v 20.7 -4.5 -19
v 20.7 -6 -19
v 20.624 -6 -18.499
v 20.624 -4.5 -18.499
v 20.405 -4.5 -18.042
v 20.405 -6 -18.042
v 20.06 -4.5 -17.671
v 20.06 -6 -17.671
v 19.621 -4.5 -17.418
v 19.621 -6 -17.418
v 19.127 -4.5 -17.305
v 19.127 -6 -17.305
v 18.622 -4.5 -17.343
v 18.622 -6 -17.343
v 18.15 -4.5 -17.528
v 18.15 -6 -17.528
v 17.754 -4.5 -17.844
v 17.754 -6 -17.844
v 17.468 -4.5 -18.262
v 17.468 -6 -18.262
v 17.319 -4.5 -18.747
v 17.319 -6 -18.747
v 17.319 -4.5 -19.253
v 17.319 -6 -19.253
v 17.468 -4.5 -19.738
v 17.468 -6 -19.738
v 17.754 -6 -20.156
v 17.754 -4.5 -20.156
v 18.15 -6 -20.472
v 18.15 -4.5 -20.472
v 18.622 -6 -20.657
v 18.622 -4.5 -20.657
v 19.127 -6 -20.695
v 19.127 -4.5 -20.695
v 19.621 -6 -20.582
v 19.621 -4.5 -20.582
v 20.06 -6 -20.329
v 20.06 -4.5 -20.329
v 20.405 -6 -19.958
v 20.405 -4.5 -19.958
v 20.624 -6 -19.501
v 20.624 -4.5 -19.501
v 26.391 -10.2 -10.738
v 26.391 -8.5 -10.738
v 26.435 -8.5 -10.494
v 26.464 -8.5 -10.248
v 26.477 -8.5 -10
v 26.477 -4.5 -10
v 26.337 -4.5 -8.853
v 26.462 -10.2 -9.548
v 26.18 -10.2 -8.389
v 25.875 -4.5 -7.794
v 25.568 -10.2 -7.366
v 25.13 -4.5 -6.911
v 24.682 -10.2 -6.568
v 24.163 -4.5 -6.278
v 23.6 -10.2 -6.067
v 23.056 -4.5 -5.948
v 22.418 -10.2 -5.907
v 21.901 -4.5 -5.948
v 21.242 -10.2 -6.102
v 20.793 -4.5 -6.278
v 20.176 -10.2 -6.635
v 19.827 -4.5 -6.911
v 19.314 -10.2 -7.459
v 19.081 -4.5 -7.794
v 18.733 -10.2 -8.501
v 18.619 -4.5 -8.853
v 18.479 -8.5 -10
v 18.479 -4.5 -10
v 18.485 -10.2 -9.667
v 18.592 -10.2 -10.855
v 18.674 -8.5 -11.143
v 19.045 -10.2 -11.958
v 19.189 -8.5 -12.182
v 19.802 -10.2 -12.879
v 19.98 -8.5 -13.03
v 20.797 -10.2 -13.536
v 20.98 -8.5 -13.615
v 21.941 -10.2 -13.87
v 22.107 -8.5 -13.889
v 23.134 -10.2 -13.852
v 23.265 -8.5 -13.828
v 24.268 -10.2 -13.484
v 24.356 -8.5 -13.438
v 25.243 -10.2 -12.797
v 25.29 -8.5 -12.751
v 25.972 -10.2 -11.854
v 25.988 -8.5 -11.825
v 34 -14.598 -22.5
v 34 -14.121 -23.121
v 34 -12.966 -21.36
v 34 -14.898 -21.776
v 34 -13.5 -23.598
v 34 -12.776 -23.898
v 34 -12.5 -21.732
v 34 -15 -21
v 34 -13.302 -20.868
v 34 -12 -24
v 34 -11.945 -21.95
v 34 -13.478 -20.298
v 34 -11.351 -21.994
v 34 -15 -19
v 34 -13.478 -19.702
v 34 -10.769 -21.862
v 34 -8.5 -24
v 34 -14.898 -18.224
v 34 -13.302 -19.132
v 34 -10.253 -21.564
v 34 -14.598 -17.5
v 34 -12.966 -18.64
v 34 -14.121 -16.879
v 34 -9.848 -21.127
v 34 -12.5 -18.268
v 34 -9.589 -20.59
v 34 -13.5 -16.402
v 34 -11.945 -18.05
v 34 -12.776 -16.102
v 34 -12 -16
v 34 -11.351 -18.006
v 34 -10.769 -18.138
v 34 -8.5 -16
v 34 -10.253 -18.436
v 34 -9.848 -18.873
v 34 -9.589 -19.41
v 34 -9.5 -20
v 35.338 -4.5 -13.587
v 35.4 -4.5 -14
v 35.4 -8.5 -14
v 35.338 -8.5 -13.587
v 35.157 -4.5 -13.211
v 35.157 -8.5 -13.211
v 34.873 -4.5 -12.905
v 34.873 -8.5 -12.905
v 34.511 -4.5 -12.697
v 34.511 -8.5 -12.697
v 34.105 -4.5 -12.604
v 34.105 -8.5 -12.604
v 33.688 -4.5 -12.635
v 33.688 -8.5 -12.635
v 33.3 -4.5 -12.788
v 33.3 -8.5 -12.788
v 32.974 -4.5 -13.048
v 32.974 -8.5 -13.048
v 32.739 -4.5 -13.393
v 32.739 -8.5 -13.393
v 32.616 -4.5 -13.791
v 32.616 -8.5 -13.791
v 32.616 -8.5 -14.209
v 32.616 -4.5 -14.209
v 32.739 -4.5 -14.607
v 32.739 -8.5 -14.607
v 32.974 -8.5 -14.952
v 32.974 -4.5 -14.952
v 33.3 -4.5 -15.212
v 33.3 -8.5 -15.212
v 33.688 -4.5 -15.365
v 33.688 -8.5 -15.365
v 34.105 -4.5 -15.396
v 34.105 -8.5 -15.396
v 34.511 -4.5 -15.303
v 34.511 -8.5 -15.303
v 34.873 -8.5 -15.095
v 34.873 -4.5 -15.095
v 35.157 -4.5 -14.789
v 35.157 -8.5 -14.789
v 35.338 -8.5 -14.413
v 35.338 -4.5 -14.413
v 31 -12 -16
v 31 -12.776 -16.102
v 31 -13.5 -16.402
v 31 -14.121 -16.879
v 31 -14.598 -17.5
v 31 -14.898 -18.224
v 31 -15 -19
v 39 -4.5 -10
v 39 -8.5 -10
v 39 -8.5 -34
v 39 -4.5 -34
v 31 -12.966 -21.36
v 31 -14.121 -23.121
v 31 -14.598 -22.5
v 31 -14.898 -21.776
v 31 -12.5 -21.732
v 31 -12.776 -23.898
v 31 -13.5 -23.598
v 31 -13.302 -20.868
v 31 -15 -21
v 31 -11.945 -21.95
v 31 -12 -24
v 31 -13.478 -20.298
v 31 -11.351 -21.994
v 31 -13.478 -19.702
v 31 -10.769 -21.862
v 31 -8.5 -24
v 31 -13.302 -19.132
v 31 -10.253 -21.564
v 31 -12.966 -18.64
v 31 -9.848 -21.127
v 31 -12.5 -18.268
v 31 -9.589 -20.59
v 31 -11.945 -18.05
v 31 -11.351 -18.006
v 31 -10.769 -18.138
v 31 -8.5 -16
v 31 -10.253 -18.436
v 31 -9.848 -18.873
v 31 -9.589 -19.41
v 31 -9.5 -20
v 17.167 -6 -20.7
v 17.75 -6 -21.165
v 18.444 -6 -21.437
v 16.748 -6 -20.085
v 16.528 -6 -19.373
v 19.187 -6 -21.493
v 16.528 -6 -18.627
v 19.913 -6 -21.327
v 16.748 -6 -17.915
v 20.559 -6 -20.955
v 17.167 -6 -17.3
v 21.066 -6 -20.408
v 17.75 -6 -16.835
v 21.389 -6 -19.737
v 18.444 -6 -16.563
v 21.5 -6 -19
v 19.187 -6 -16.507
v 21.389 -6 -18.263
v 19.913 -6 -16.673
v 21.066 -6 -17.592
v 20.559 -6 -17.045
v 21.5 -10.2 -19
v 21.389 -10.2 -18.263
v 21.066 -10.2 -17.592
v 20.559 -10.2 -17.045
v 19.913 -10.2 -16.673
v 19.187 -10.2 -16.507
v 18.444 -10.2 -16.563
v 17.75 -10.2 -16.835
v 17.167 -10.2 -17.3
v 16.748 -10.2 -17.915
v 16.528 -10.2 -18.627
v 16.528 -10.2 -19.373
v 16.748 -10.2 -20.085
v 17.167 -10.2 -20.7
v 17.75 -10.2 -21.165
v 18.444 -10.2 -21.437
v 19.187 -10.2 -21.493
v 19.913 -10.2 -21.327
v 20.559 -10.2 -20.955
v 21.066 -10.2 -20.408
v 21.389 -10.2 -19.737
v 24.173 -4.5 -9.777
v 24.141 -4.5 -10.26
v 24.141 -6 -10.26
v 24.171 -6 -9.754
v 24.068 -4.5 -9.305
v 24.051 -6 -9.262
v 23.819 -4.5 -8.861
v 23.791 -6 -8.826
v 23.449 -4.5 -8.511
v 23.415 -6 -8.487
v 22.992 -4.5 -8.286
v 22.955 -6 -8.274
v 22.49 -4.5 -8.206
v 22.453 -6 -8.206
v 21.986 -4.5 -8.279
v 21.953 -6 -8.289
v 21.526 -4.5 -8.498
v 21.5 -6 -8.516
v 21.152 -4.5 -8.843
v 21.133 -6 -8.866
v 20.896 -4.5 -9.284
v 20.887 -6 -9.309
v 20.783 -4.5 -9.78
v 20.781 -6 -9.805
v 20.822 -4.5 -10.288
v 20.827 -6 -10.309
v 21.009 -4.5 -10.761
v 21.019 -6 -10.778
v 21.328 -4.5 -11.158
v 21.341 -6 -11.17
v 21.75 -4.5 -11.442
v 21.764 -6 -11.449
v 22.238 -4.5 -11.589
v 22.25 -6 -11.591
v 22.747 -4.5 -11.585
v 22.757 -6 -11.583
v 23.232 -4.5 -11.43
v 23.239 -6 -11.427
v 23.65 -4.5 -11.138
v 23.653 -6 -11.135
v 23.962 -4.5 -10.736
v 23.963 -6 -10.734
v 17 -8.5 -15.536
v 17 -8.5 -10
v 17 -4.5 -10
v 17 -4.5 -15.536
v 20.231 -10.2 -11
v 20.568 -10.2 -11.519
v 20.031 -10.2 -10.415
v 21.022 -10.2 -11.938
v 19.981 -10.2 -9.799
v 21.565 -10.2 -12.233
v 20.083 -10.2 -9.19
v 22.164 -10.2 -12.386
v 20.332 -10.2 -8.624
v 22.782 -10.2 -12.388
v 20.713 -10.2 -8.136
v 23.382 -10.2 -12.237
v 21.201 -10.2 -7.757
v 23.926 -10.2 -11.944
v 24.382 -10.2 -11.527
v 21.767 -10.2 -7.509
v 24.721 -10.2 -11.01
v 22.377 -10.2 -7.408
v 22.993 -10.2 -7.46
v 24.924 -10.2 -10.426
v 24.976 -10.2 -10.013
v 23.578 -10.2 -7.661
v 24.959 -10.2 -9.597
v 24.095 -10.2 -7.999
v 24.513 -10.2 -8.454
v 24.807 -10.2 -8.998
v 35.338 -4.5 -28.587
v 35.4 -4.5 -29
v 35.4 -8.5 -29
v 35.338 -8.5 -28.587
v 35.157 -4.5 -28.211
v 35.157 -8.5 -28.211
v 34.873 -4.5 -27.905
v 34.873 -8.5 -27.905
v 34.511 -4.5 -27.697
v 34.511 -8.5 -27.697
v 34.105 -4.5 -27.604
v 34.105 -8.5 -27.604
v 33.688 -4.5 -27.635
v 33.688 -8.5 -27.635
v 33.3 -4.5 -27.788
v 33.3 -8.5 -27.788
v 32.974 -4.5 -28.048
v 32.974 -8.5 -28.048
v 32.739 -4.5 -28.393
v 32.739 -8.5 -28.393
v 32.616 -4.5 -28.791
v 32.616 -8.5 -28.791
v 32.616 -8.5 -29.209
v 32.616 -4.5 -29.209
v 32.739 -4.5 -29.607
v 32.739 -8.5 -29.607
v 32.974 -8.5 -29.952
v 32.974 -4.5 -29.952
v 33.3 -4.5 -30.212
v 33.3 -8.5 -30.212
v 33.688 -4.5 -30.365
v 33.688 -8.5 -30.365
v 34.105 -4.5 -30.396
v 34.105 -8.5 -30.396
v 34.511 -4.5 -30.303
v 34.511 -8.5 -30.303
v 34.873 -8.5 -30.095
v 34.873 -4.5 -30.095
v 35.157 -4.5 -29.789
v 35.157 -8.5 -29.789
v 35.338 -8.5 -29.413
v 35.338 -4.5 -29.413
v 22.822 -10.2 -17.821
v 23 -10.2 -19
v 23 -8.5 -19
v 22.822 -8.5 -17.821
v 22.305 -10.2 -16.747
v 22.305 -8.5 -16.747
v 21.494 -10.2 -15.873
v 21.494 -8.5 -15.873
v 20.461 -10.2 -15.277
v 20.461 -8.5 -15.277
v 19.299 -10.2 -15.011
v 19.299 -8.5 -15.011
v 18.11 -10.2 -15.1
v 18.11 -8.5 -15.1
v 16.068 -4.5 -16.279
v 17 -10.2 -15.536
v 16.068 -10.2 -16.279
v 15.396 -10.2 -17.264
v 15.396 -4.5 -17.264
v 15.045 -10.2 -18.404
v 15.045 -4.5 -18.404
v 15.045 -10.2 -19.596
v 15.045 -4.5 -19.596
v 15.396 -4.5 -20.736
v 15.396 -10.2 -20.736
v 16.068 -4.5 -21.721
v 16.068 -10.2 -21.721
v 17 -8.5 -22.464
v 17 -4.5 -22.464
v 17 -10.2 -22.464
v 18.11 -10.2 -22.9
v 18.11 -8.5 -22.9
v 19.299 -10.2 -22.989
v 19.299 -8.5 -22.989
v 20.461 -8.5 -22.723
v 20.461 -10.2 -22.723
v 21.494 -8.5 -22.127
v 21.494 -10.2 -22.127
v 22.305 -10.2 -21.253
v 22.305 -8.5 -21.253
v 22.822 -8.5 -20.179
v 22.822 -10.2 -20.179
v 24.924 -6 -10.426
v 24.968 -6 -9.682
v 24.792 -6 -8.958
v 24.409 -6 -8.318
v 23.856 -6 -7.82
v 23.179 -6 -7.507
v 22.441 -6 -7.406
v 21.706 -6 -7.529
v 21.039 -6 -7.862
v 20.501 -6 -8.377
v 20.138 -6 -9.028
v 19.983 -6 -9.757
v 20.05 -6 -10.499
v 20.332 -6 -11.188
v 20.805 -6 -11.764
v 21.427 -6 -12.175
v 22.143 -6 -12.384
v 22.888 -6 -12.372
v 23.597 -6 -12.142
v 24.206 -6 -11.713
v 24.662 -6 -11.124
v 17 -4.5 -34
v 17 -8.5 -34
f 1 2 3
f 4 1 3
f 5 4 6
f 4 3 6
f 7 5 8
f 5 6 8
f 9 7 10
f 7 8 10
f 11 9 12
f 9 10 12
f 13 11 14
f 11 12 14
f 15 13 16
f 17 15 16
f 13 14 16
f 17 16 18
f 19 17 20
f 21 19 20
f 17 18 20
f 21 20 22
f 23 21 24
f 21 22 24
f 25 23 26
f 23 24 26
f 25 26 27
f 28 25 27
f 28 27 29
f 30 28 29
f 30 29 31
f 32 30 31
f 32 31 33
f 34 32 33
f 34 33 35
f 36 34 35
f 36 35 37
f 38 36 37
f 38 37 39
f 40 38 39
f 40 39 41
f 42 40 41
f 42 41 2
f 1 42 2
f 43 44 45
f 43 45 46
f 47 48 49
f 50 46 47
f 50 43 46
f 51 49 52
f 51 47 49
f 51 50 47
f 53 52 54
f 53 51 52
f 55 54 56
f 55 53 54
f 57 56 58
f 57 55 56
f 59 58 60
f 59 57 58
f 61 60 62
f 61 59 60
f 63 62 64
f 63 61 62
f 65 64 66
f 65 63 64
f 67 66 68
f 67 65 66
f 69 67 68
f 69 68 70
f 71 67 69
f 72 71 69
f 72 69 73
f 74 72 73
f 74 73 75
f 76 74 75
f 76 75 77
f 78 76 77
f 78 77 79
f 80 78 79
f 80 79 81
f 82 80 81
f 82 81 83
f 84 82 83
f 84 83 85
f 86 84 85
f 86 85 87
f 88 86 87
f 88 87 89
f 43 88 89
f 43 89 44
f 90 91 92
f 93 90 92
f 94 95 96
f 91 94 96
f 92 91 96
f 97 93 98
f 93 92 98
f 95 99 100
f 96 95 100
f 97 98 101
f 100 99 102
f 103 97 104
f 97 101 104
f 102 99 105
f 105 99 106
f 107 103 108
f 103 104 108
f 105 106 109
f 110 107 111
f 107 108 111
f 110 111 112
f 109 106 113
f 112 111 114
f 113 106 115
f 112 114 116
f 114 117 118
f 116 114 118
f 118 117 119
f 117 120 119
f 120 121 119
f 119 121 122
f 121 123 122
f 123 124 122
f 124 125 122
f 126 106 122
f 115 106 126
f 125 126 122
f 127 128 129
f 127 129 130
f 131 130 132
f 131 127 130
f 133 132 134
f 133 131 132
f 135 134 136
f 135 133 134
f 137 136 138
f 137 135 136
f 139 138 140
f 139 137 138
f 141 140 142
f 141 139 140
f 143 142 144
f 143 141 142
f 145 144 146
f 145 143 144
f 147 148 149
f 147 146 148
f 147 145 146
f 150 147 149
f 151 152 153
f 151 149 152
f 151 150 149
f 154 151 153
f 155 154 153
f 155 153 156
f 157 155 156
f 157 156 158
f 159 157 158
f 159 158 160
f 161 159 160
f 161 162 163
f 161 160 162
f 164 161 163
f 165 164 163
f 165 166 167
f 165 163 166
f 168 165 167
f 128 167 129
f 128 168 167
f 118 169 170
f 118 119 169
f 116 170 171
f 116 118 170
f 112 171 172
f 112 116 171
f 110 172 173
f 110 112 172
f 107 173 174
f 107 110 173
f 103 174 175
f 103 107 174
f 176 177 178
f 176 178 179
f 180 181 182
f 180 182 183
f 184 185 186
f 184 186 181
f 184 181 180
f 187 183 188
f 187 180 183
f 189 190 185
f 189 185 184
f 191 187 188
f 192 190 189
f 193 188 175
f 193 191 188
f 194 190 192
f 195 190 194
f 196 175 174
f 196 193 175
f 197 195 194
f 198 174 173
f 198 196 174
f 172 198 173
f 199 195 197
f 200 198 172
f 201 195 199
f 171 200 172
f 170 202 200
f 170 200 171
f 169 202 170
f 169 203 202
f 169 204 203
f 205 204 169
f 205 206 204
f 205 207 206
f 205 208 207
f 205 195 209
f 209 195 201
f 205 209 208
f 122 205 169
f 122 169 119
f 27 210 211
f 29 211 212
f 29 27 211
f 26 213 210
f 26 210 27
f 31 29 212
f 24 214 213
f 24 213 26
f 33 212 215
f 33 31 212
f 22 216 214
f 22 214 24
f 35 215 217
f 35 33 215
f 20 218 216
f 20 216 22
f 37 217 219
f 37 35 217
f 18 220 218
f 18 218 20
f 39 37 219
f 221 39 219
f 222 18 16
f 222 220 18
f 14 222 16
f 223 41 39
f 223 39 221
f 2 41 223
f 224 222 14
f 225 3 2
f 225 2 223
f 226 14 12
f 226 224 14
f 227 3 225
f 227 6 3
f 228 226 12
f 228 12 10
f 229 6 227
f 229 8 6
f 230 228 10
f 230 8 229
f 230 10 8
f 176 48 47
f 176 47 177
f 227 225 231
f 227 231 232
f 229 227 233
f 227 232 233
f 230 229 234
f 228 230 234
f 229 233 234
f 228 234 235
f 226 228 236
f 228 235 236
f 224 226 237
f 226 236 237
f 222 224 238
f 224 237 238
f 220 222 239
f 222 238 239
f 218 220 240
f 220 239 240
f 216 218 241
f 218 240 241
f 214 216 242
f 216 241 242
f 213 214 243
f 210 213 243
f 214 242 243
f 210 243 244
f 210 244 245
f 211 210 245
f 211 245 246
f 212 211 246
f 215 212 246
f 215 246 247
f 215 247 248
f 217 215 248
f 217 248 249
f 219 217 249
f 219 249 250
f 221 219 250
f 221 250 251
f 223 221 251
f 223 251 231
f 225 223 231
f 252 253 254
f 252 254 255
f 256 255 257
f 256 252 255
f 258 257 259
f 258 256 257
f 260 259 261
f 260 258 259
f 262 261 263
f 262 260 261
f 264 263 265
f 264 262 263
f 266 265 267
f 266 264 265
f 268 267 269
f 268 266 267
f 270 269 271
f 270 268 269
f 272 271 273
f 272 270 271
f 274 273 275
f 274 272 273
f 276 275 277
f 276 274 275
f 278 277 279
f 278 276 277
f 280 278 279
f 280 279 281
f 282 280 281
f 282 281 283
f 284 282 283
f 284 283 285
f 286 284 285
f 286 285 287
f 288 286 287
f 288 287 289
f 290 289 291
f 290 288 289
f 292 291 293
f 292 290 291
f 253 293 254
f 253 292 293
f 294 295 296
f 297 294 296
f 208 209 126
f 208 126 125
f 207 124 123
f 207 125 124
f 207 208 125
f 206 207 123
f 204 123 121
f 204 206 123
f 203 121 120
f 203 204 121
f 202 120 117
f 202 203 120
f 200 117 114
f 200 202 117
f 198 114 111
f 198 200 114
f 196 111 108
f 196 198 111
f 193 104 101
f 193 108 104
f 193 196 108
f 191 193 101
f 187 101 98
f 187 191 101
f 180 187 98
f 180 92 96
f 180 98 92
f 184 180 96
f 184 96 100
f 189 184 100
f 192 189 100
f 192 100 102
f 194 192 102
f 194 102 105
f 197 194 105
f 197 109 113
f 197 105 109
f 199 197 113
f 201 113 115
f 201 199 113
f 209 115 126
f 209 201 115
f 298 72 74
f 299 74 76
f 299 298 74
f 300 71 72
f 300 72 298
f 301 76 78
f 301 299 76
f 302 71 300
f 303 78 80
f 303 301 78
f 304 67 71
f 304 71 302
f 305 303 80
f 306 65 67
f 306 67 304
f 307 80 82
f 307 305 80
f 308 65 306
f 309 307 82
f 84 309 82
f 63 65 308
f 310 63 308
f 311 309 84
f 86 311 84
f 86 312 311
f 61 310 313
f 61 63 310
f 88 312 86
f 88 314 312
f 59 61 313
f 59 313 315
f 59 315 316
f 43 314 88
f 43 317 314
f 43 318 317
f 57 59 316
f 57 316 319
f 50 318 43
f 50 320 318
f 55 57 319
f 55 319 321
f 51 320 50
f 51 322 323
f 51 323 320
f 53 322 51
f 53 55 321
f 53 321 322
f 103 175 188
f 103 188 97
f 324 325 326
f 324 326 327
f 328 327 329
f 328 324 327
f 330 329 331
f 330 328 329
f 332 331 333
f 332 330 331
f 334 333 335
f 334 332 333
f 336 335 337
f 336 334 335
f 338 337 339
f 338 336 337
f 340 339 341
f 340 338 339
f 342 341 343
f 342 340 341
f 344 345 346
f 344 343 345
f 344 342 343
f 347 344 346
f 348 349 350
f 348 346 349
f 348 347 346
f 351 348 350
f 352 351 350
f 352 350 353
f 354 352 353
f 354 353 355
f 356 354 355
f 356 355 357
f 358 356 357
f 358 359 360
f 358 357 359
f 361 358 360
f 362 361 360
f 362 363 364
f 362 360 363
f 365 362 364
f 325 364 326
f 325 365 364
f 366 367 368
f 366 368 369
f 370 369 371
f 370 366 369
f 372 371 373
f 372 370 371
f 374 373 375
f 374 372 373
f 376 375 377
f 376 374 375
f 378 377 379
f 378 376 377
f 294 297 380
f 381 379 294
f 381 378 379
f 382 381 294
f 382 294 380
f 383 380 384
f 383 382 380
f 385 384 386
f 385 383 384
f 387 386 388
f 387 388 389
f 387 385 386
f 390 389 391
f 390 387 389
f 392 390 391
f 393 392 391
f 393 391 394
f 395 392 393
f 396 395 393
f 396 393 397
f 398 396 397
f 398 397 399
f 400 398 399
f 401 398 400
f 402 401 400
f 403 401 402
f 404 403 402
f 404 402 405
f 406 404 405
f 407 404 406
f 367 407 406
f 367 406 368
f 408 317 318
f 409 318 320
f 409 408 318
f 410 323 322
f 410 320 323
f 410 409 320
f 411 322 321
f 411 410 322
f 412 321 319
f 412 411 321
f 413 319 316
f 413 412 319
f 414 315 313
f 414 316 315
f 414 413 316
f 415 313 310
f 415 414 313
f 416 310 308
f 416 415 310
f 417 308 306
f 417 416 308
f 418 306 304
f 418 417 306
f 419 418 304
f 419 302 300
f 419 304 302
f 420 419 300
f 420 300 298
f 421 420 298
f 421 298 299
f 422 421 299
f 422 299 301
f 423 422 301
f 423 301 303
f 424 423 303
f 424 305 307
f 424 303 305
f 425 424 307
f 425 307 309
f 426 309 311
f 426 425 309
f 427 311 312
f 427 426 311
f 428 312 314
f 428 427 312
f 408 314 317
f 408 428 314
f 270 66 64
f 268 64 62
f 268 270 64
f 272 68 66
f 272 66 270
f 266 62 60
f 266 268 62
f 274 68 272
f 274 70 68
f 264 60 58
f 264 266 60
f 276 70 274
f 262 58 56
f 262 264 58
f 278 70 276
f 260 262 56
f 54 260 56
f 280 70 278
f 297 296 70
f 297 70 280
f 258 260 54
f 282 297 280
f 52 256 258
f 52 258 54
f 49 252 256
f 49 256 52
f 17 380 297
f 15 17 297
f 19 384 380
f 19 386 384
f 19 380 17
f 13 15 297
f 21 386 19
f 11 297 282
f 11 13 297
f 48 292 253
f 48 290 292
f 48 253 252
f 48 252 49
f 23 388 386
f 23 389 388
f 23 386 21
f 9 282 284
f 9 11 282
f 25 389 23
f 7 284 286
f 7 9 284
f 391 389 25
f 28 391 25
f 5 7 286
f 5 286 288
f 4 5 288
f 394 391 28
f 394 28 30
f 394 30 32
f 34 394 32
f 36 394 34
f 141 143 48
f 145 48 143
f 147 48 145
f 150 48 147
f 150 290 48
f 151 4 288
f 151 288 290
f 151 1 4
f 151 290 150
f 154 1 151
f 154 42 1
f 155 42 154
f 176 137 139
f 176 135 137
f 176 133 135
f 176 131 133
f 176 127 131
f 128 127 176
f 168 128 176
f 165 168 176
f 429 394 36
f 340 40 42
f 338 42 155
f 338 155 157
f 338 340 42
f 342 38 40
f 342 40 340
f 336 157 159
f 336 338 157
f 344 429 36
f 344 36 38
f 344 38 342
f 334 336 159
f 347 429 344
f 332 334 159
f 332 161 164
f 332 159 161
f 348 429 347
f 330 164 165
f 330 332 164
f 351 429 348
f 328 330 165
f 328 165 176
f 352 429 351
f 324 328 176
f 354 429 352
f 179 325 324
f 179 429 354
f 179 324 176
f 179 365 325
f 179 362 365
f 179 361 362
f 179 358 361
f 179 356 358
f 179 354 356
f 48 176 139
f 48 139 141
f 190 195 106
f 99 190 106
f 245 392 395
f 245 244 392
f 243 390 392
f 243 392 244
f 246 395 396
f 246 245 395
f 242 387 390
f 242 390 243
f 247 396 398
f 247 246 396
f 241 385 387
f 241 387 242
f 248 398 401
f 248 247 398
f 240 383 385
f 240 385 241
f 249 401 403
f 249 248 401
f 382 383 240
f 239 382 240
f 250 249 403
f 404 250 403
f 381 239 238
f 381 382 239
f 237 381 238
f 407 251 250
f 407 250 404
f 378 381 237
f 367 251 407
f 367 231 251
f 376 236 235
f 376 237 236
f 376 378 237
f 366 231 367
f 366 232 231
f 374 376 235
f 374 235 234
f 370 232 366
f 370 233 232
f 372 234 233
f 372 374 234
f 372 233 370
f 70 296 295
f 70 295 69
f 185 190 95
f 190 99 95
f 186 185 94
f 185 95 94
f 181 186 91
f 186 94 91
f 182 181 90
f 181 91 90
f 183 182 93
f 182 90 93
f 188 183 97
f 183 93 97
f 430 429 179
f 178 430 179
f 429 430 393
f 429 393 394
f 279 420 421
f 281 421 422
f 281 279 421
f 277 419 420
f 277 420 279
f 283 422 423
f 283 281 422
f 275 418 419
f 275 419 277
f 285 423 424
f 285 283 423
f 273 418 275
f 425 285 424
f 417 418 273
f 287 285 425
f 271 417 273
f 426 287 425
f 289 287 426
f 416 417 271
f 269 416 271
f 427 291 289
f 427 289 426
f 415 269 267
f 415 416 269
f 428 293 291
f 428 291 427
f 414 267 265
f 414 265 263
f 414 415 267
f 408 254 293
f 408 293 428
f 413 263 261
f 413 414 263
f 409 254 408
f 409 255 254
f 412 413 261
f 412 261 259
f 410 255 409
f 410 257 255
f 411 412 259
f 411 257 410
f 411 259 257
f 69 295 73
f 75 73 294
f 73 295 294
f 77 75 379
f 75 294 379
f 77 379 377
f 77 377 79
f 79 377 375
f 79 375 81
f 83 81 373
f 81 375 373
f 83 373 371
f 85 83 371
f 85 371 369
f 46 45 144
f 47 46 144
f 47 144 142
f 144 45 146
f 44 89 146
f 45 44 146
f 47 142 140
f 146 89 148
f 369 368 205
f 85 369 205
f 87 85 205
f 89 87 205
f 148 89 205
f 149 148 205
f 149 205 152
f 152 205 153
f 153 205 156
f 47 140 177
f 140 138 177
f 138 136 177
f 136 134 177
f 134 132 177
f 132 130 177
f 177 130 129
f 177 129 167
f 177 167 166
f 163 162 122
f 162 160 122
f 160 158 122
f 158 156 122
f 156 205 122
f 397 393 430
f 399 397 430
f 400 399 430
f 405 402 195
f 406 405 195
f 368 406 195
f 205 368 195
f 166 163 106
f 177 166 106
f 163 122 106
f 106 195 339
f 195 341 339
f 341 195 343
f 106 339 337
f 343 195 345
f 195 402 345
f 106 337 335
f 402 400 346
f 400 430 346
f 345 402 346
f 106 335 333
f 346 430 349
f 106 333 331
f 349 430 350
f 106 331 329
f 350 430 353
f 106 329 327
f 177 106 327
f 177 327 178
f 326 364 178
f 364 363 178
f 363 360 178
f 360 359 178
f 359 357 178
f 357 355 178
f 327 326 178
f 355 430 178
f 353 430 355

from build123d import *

# Parameters (mm, degrees)
CYLINDER267_R               = 2
CYLINDER267_DEPTH           = 10
CYLINDER267_PITCH_ANGLE     = 90
BOX001027045199_W           = 3
BOX001027045199_H           = 8
BOX001027045199_DEPTH       = 8
FILLET045_R                 = 3
CUT240_ROLL_ANGLE           = 90
CYLINDER257_R               = 2.5
CYLINDER257_DEPTH           = 30
CYLINDER257_ROLL_ANGLE      = 90
CYLINDER258_R               = 1.7
CYLINDER258_DEPTH           = 50
CYLINDER258_ROLL_ANGLE      = 90
CYLINDER262_R               = 1.7
CYLINDER262_DEPTH           = 30
CYLINDER262_ROLL_ANGLE      = 89.999963
CYLINDER262_PITCH_ANGLE     = 11.999988
CYLINDER262_PLACEMENT_ANGLE = -4e-06
CYLINDER259_R               = 2.5
CYLINDER259_DEPTH           = 20
CYLINDER259_ROLL_ANGLE      = 89.999963
CYLINDER259_PITCH_ANGLE     = 11.999988
CYLINDER259_PLACEMENT_ANGLE = -4e-06
CYLINDER231_R               = 1.4
CYLINDER231_DEPTH           = 20
CYLINDER231_ROLL_ANGLE      = 90
CYLINDER230_R               = 1.4
CYLINDER230_DEPTH           = 20
CYLINDER230_ROLL_ANGLE      = 90
BOX001027045174_W           = 22
BOX001027045174_H           = 4
BOX001027045174_DEPTH       = 24
CYLINDER260_R               = 4
CYLINDER260_DEPTH           = 5.7
CYLINDER260_ROLL_ANGLE      = 90
CYLINDER261_R               = 4
CYLINDER261_DEPTH           = 5.7
CYLINDER261_ROLL_ANGLE      = 90
CYLINDER261_PITCH_ANGLE     = 12


with BuildPart() as cylinder285:
    # Cylinder267 → Cylinder267 (new body)
    with BuildSketch(Plane.XY):
        Circle(CYLINDER267_R)
    extrude(amount=CYLINDER267_DEPTH)


with BuildPart() as cylinder285_1:
    # Cylinder267 pitch: moved
    add(cylinder285.part.rotate(Axis((0, 0, 0), (0, 1, 0)), CYLINDER267_PITCH_ANGLE))


with BuildPart() as cylinder285_2:
    # Cylinder267 placement: moved
    add(cylinder285_1.part.moved(Location((-3, 4, 4.5))))


with BuildPart() as cut240:
    # Box001027045199 → Box001027045199 (new body)
    with BuildSketch(Plane.XY):
        with Locations((1.5, 4)):
            Rectangle(BOX001027045199_W, BOX001027045199_H)
    extrude(amount=BOX001027045199_DEPTH)

    # Fillet045
    fillet045_edges = [cut240.edges().sort_by_distance(p)[0] for p in [
        (1.5, 0, 8),
        (1.5, 8, 8),
    ]]
    fillet(fillet045_edges, radius=FILLET045_R)

    # Cut240: cut Cylinder285
    add(cylinder285_2.part, mode=Mode.SUBTRACT)


with BuildPart() as cut240_1:
    # Cut240 roll: moved
    add(cut240.part.rotate(Axis((0, 0, 0), (1, 0, 0)), CUT240_ROLL_ANGLE))


with BuildPart() as cut240_2:
    # Cut240 placement: moved
    add(cut240_1.part.moved(Location((31, -7, -24))))


with BuildPart() as cylinder275:
    # Cylinder257 → Cylinder257 (new body)
    with BuildSketch(Plane.XY):
        Circle(CYLINDER257_R)
    extrude(amount=CYLINDER257_DEPTH)


with BuildPart() as cylinder275_1:
    # Cylinder257 roll: moved
    add(cylinder275.part.rotate(Axis((0, 0, 0), (1, 0, 0)), CYLINDER257_ROLL_ANGLE))


with BuildPart() as cylinder275_2:
    # Cylinder257 placement: moved
    add(cylinder275_1.part.moved(Location((23, 36, -19))))


with BuildPart() as fusion112142:
    # Cylinder258 → Cylinder258 (new body)
    with BuildSketch(Plane.XY):
        Circle(CYLINDER258_R)
    extrude(amount=CYLINDER258_DEPTH)


with BuildPart() as fusion112142_1:
    # Cylinder258 roll: moved
    add(fusion112142.part.rotate(Axis((0, 0, 0), (1, 0, 0)), CYLINDER258_ROLL_ANGLE))


with BuildPart() as fusion112142_2:
    # Cylinder258 placement: moved
    add(fusion112142_1.part.moved(Location((23, 18, -19))))

    # Fusion112142: union Cylinder275
    add(cylinder275_2.part)


with BuildPart() as part_mirroring016:
    # Part__Mirroring016: instance of Fusion112142
    add(fusion112142_2.part.mirror(Plane(origin=(0, 0, 0), x_dir=(1, 0, 0), z_dir=(0, 1, 0))))


with BuildPart() as part_mirroring016_1:
    # Part__Mirroring016 placement: moved
    add(part_mirroring016.part.moved(Location((-4, 0, 0))))


with BuildPart() as cylinder280:
    # Cylinder262 → Cylinder262 (new body)
    with BuildSketch(Plane.XY):
        Circle(CYLINDER262_R)
    extrude(amount=CYLINDER262_DEPTH)


with BuildPart() as cylinder280_1:
    # Cylinder262 roll: moved
    add(cylinder280.part.rotate(Axis((0, 0, 0), (1, 0, 0)), CYLINDER262_ROLL_ANGLE))


with BuildPart() as cylinder280_2:
    # Cylinder262 pitch: moved
    add(cylinder280_1.part.rotate(Axis((0, 0, 0), (0, 1, 0)), CYLINDER262_PITCH_ANGLE))


with BuildPart() as cylinder280_3:
    # Cylinder262 placement: moved
    add(cylinder280_2.part.moved(Location((22.4783, 12.2, -9.9062))).rotate(Axis((22.4783, 12.2, -9.9062), (0, 0, 1)), CYLINDER262_PLACEMENT_ANGLE))


with BuildPart() as fusion112149:
    # Cylinder259 → Cylinder259 (new body)
    with BuildSketch(Plane.XY):
        Circle(CYLINDER259_R)
    extrude(amount=CYLINDER259_DEPTH)


with BuildPart() as fusion112149_1:
    # Cylinder259 roll: moved
    add(fusion112149.part.rotate(Axis((0, 0, 0), (1, 0, 0)), CYLINDER259_ROLL_ANGLE))


with BuildPart() as fusion112149_2:
    # Cylinder259 pitch: moved
    add(fusion112149_1.part.rotate(Axis((0, 0, 0), (0, 1, 0)), CYLINDER259_PITCH_ANGLE))


with BuildPart() as fusion112149_3:
    # Cylinder259 placement: moved
    add(fusion112149_2.part.moved(Location((22.4783, -6, -9.9062))).rotate(Axis((22.4783, -6, -9.9062), (0, 0, 1)), CYLINDER259_PLACEMENT_ANGLE))

    # Fusion112146: union Cylinder280
    add(cylinder280_3.part)

    # Fusion112149: union Part__Mirroring016
    add(part_mirroring016_1.part)


with BuildPart() as m3_tap006:
    # Cylinder231 → Cylinder231 (new body)
    with BuildSketch(Plane.XY):
        Circle(CYLINDER231_R)
    extrude(amount=CYLINDER231_DEPTH)


with BuildPart() as m3_tap006_1:
    # Cylinder231 roll: moved
    add(m3_tap006.part.rotate(Axis((0, 0, 0), (1, 0, 0)), CYLINDER231_ROLL_ANGLE))


with BuildPart() as m3_tap006_2:
    # Cylinder231 placement: moved
    add(m3_tap006_1.part.moved(Location((34, 5, -29))))


with BuildPart() as fusion112123:
    # Cylinder230 → Cylinder230 (new body)
    with BuildSketch(Plane.XY):
        Circle(CYLINDER230_R)
    extrude(amount=CYLINDER230_DEPTH)


with BuildPart() as fusion112123_1:
    # Cylinder230 roll: moved
    add(fusion112123.part.rotate(Axis((0, 0, 0), (1, 0, 0)), CYLINDER230_ROLL_ANGLE))


with BuildPart() as fusion112123_2:
    # Cylinder230 placement: moved
    add(fusion112123_1.part.moved(Location((34, 5, -14))))

    # Fusion112123: union M3-tap006
    add(m3_tap006_2.part)


with BuildPart() as cut234:
    # Box001027045174 → Box001027045174 (new body)
    with BuildSketch(Plane(origin=(17, -8.5, -34), x_dir=(1, 0, 0), z_dir=(0, 0, 1))):
        with Locations((11, 2)):
            Rectangle(BOX001027045174_W, BOX001027045174_H)
    extrude(amount=BOX001027045174_DEPTH)

    # Cut234: cut Fusion112123
    add(fusion112123_2.part, mode=Mode.SUBTRACT)


with BuildPart() as cylinder278:
    # Cylinder260 → Cylinder260 (new body)
    with BuildSketch(Plane.XY):
        Circle(CYLINDER260_R)
    extrude(amount=CYLINDER260_DEPTH)


with BuildPart() as cylinder278_1:
    # Cylinder260 roll: moved
    add(cylinder278.part.rotate(Axis((0, 0, 0), (1, 0, 0)), CYLINDER260_ROLL_ANGLE))


with BuildPart() as cylinder278_2:
    # Cylinder260 placement: moved
    add(cylinder278_1.part.moved(Location((19, 10.2, -19))))


with BuildPart() as part_mirroring017:
    # Part__Mirroring017: instance of Cylinder278
    add(cylinder278_2.part.mirror(Plane(origin=(0, 0, 0), x_dir=(1, 0, 0), z_dir=(0, 1, 0))))


with BuildPart() as cylinder279:
    # Cylinder261 → Cylinder261 (new body)
    with BuildSketch(Plane.XY):
        Circle(CYLINDER261_R)
    extrude(amount=CYLINDER261_DEPTH)


with BuildPart() as cylinder279_1:
    # Cylinder261 roll: moved
    add(cylinder279.part.rotate(Axis((0, 0, 0), (1, 0, 0)), CYLINDER261_ROLL_ANGLE))


with BuildPart() as cylinder279_2:
    # Cylinder261 pitch: moved
    add(cylinder279_1.part.rotate(Axis((0, 0, 0), (0, 1, 0)), CYLINDER261_PITCH_ANGLE))


with BuildPart() as cylinder279_3:
    # Cylinder261 placement: moved
    add(cylinder279_2.part.moved(Location((22.478298, 10.2, -9.906203))))


with BuildPart() as clamp_plate:
    # Part__Mirroring018: instance of Cylinder279
    add(cylinder279_3.part.mirror(Plane(origin=(0, 0, 0), x_dir=(1, 0, 0), z_dir=(0, 1, 0))))

    # Fusion112144: union Part__Mirroring017
    add(part_mirroring017.part)

    # Fusion112145: union Cut234
    add(cut234.part)

    # Cut236: cut Fusion112149
    add(fusion112149_3.part, mode=Mode.SUBTRACT)

    # Fusion112155: union Cut240
    add(cut240_2.part)


solid = clamp_plate.part
